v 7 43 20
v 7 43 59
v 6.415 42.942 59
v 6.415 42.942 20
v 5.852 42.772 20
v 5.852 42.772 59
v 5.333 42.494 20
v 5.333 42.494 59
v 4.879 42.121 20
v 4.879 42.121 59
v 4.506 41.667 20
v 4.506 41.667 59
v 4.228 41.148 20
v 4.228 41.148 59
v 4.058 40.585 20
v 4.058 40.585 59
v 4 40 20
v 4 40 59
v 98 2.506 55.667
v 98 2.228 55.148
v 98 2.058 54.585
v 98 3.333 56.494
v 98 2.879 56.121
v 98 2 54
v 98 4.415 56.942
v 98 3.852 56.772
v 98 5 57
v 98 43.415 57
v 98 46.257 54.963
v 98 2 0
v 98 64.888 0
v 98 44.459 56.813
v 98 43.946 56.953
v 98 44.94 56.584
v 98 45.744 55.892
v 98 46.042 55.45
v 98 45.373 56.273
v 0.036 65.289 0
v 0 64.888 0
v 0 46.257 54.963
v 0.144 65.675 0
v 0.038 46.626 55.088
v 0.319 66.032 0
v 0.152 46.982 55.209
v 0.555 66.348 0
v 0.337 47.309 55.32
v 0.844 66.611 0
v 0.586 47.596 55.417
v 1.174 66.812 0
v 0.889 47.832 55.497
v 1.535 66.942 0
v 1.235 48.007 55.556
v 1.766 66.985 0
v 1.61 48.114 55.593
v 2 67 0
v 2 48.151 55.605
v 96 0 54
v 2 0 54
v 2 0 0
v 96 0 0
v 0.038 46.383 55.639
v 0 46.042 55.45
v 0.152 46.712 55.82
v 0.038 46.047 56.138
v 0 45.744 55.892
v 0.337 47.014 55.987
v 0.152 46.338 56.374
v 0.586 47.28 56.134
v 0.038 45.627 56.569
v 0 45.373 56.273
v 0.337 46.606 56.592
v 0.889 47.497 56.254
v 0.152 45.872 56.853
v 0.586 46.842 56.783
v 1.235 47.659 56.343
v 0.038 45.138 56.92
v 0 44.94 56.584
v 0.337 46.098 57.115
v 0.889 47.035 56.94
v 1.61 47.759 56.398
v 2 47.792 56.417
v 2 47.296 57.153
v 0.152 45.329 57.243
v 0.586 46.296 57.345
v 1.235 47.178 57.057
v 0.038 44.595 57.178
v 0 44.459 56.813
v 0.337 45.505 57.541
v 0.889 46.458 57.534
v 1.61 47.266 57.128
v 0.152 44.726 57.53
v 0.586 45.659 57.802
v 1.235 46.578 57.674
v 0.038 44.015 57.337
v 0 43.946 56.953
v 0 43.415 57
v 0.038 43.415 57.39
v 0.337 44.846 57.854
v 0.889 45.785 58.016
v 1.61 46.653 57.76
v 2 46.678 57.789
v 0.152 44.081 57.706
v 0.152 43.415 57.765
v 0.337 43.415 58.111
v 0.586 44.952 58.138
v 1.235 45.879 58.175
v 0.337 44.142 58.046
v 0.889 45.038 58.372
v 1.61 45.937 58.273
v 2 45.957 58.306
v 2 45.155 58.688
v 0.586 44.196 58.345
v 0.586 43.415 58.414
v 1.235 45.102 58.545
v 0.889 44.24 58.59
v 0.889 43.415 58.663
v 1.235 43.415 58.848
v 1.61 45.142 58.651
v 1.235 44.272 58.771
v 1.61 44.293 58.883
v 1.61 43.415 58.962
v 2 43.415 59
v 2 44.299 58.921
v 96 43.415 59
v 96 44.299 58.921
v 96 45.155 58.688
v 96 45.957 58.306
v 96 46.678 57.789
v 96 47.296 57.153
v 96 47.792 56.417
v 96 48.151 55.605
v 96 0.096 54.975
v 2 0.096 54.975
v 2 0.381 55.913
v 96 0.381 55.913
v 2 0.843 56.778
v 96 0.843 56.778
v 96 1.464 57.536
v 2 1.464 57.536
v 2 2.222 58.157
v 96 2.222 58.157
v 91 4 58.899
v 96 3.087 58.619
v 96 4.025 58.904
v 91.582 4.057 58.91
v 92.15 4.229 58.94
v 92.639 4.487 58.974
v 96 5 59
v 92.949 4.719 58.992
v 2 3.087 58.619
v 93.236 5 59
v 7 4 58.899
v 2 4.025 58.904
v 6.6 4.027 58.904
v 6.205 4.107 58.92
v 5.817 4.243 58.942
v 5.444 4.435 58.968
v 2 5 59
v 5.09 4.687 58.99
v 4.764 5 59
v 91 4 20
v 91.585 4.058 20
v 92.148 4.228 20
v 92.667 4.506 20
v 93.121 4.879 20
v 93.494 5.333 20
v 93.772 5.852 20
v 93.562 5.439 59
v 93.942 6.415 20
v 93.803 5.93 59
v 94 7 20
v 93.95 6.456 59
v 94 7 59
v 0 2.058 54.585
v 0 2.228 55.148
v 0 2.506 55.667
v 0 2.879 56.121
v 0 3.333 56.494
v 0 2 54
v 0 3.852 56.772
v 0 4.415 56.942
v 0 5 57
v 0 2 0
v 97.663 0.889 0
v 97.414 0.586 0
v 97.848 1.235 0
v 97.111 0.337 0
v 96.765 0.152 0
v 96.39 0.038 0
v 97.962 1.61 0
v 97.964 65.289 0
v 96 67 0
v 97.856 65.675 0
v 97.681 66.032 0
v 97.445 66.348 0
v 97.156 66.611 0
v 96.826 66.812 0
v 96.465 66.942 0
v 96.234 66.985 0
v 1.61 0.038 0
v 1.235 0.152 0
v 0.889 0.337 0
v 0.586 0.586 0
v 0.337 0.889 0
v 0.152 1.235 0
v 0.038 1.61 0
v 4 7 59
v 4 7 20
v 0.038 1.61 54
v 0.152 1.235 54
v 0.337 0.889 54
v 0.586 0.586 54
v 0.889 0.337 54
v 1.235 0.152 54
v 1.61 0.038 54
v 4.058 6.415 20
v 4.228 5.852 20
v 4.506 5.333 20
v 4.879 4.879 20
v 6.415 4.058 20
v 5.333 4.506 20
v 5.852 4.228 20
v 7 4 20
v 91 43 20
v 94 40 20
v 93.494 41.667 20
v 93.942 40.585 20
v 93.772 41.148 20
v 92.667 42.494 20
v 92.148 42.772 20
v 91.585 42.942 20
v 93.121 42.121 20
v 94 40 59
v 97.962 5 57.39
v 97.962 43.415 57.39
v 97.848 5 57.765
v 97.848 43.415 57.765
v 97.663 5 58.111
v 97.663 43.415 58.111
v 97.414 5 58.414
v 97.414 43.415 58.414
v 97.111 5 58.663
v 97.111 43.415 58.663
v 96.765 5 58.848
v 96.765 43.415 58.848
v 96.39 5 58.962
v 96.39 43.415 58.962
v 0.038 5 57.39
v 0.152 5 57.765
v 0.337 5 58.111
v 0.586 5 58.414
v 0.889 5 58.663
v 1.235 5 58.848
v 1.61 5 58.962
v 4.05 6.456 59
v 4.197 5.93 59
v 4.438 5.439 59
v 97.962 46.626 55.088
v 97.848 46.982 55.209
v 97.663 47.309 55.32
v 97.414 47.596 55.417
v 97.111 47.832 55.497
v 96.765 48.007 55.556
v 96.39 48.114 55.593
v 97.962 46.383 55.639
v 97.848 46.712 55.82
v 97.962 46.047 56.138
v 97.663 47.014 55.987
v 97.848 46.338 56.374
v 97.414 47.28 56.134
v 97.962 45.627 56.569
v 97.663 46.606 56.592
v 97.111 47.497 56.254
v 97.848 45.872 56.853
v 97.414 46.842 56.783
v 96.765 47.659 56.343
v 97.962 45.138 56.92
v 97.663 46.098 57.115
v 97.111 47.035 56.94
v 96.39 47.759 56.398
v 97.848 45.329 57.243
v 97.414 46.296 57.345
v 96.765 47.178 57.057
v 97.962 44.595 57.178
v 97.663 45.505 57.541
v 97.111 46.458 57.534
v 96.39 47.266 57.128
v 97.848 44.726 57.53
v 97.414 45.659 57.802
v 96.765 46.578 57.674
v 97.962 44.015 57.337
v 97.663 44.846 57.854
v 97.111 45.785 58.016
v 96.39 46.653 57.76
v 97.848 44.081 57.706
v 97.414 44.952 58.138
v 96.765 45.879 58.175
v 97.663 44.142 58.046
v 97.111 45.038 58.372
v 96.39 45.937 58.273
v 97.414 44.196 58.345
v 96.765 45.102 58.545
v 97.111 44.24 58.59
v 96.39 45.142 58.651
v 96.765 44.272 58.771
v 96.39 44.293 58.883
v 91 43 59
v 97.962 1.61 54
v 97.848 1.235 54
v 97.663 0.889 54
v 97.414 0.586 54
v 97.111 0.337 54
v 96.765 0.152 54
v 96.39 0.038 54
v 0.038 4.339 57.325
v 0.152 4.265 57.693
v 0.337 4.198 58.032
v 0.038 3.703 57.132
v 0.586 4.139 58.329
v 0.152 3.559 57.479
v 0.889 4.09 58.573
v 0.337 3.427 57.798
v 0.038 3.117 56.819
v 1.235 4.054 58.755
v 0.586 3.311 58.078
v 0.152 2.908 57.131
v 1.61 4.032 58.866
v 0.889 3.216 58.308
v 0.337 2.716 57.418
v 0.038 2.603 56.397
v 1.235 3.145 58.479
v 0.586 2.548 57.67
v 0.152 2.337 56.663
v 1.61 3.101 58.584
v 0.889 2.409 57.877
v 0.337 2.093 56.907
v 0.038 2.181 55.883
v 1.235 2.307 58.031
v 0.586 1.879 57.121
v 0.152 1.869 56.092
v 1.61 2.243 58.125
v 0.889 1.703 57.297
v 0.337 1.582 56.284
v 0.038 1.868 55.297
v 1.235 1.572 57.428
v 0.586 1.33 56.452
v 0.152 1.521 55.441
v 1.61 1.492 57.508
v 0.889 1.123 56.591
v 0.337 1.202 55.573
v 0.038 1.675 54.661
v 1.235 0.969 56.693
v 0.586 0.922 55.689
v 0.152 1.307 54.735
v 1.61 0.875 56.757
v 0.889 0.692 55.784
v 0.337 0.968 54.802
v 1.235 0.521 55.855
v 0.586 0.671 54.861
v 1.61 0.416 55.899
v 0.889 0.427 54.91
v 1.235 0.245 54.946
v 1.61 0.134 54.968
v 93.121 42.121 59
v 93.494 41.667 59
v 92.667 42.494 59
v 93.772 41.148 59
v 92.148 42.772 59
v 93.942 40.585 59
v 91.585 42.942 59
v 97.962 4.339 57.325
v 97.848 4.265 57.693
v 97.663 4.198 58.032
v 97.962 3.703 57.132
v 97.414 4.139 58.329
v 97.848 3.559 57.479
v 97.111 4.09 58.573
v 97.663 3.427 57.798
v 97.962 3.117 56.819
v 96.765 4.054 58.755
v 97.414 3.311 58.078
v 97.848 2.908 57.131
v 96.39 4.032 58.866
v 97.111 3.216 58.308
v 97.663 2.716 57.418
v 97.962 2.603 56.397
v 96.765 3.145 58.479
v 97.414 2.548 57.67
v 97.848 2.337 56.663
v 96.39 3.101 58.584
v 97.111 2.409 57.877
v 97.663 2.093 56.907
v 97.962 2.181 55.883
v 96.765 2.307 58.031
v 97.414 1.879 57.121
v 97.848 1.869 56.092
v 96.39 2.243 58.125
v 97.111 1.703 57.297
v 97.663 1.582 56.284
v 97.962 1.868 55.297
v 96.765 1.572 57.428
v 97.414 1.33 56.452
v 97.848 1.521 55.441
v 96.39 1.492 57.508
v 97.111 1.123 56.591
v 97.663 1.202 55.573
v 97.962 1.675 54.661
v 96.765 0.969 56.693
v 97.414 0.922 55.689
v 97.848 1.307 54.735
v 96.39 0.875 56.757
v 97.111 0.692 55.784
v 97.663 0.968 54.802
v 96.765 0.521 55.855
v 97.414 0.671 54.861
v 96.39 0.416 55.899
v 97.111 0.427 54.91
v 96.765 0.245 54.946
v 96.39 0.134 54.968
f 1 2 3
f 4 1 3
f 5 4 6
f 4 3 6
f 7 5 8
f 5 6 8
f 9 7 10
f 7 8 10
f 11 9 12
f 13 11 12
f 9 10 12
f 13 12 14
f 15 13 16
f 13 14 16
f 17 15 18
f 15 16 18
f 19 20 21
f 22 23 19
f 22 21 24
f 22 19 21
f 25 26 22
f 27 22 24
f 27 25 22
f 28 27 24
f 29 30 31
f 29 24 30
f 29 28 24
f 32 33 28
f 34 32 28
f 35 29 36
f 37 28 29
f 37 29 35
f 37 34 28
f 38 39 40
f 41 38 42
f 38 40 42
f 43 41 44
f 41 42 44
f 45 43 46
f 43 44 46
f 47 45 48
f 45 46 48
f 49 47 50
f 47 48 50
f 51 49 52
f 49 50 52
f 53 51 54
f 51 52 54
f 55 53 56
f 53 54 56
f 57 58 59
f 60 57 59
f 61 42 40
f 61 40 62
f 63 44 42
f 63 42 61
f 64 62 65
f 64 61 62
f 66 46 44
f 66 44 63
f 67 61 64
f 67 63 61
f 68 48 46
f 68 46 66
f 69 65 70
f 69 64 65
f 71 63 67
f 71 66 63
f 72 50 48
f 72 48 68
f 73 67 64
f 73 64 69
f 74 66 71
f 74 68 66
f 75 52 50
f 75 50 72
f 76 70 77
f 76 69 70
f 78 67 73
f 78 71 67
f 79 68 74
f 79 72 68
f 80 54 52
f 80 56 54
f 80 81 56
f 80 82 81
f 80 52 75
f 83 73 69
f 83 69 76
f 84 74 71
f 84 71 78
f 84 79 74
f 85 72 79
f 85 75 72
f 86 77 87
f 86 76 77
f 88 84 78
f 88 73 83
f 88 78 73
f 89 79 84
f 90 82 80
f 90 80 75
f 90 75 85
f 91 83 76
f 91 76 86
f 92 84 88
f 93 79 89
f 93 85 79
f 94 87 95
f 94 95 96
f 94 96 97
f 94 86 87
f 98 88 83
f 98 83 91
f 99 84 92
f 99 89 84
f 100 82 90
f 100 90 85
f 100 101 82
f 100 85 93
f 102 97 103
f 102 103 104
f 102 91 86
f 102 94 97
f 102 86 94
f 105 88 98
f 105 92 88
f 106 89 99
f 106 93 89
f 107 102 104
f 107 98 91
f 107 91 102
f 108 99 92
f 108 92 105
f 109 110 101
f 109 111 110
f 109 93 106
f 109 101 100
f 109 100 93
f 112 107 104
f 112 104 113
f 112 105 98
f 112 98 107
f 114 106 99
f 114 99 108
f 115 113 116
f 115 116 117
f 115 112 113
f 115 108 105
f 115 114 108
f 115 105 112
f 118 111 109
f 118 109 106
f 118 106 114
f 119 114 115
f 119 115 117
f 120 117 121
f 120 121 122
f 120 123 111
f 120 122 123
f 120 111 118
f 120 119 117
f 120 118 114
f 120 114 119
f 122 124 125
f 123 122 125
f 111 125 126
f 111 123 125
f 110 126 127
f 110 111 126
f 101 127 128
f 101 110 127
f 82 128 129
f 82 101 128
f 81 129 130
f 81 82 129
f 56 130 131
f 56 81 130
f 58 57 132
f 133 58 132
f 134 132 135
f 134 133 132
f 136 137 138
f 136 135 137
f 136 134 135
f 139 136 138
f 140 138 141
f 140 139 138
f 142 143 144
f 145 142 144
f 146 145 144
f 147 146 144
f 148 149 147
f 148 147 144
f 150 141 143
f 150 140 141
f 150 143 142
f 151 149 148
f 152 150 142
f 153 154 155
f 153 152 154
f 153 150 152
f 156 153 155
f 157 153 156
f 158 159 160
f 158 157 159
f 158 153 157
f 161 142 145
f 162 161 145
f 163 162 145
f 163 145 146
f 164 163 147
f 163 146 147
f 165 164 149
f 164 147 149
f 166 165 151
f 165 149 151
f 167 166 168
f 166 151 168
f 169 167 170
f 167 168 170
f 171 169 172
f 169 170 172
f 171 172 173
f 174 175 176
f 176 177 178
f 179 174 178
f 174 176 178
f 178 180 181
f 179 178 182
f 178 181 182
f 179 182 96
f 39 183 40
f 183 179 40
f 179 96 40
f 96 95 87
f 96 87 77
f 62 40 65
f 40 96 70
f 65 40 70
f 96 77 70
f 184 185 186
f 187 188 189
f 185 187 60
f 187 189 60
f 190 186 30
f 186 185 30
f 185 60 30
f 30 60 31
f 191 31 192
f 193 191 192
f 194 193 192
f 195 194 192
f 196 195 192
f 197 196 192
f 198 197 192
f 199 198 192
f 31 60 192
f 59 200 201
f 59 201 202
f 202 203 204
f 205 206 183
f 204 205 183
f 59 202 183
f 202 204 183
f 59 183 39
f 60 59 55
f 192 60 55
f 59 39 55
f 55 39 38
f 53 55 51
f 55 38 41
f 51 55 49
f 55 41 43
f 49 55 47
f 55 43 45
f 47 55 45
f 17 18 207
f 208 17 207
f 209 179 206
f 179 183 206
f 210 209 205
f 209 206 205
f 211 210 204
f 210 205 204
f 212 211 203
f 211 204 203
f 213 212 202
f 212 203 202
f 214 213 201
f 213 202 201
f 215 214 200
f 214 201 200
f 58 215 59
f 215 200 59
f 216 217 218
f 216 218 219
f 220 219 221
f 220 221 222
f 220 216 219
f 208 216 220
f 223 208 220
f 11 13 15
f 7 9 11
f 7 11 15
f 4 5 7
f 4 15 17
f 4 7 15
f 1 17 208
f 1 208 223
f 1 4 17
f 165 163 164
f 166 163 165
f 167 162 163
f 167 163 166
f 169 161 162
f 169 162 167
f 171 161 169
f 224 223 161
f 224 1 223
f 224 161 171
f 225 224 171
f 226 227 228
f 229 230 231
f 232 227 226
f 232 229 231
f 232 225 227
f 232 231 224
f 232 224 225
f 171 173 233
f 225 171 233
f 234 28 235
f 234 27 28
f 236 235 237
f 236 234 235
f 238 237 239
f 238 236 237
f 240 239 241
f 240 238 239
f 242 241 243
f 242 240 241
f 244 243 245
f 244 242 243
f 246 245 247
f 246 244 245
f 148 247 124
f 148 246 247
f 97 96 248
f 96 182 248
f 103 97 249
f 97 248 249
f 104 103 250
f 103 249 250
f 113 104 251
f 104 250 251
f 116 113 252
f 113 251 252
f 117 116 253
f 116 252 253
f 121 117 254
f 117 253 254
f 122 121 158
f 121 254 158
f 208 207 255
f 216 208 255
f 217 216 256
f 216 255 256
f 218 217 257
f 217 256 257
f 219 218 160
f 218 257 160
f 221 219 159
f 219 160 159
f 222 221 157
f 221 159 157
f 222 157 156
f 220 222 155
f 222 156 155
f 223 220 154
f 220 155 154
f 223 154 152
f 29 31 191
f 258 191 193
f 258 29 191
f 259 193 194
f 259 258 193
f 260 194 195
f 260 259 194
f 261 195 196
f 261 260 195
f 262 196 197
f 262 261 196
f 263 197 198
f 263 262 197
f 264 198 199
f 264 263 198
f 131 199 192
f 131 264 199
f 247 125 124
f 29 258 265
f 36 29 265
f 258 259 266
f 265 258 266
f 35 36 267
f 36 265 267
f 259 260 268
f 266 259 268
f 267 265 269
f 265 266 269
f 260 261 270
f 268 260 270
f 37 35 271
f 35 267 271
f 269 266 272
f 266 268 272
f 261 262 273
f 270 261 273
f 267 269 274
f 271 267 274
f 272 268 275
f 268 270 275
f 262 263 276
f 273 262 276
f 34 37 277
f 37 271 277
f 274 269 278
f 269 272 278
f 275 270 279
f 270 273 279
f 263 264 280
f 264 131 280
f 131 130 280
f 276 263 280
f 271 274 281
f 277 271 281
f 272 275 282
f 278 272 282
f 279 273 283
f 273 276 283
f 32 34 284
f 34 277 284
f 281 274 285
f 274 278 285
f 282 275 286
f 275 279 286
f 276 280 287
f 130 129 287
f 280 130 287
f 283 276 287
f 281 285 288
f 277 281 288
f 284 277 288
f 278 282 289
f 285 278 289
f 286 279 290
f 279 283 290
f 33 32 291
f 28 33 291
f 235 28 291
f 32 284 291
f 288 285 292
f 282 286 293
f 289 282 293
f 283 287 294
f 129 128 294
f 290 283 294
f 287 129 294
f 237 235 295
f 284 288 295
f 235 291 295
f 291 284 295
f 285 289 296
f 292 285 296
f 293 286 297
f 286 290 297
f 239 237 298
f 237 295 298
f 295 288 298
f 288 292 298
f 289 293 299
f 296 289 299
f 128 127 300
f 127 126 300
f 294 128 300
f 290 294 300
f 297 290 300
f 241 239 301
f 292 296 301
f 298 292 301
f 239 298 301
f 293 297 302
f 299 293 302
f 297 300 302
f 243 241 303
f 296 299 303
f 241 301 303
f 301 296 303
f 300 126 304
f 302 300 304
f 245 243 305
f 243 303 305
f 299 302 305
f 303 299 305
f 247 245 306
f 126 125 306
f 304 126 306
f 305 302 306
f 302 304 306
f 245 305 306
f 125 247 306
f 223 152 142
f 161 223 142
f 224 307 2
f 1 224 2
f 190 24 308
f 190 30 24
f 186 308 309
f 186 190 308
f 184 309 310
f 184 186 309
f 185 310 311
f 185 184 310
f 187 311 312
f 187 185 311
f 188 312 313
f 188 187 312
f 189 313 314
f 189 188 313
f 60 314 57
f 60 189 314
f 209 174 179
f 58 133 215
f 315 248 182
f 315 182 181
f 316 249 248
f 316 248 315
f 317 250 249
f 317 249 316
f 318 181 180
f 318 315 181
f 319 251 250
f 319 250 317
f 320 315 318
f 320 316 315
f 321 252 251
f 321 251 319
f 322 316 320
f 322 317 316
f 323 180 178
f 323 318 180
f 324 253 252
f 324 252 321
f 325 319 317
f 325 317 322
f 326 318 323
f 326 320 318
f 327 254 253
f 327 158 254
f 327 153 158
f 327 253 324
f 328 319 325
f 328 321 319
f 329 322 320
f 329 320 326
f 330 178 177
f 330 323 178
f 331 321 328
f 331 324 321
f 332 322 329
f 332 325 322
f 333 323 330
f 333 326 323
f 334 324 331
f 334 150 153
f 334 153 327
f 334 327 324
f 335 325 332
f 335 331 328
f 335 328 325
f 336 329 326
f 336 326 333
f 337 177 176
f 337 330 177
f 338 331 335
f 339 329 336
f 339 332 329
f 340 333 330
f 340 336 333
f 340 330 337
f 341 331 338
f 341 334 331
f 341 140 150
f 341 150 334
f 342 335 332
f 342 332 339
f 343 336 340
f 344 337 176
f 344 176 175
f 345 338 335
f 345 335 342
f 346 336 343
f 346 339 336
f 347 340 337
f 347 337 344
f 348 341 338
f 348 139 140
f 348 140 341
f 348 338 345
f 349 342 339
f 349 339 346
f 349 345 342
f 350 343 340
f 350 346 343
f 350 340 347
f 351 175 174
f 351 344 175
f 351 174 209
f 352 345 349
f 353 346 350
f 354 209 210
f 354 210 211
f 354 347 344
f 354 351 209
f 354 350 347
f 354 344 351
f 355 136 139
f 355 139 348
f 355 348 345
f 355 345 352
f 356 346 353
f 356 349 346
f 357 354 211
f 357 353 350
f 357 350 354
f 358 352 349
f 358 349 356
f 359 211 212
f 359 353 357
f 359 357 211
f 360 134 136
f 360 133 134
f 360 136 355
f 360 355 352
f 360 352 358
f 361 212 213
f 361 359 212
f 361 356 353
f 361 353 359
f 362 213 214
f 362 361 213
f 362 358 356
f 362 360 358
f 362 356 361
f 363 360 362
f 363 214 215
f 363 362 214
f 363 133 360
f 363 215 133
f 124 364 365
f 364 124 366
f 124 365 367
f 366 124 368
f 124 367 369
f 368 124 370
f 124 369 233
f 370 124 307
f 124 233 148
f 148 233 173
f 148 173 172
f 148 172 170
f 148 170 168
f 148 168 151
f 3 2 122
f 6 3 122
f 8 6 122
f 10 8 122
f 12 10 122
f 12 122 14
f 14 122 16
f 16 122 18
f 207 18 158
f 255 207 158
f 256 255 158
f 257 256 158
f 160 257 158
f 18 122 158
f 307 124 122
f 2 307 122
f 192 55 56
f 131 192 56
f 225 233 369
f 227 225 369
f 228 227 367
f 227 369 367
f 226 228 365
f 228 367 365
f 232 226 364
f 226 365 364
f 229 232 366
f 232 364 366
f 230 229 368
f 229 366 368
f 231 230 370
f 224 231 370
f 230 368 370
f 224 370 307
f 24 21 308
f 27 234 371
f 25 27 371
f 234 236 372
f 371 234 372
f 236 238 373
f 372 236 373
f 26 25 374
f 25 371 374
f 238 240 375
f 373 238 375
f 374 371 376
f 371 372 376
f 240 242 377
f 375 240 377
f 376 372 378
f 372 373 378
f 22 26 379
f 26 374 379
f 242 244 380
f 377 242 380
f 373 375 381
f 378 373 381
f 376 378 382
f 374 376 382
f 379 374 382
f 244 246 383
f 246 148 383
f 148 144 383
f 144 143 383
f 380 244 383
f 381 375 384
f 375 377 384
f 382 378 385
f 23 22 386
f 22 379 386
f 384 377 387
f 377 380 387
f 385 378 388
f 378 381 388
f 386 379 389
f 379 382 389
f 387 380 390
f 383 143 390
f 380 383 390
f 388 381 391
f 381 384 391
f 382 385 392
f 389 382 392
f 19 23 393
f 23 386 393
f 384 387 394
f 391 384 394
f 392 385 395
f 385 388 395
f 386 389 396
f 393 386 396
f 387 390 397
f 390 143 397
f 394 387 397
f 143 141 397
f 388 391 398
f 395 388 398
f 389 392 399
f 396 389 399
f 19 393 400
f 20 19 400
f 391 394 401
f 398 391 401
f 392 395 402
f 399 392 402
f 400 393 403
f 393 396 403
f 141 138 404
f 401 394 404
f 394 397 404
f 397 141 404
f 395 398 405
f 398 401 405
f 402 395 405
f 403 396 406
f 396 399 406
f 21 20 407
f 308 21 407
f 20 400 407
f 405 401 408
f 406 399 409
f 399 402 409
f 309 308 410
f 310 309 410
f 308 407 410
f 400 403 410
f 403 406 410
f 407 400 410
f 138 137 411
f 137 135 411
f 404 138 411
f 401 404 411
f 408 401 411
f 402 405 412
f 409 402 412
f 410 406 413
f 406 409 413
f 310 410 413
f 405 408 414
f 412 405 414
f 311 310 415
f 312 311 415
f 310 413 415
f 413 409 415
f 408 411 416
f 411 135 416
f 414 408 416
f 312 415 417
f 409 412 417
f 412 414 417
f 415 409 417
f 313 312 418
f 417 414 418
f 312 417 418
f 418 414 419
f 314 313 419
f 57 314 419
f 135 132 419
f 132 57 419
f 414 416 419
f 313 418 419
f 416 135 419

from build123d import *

# Parameters (mm, degrees)
F1_DEPTH    = 98
F3_DEPTH    = 39
F4_T1_DEPTH = 123
F4_T3_DEPTH = 115.9227425884
F5_R        = 2


# Not quite as in the source:
# - a fillet or chamfer that OpenCascade refuses, or shapes differently, is made with other operations: its cross-section is extruded or revolved along the edge and cut away or added


with BuildPart() as f1:
    # F0 (on Right) → F1 (new body)
    with BuildSketch(Plane.YZ):
        Polygon((0, 59), (0, 0), (67, 0), (47, 59), align=None)
    extrude(amount=F1_DEPTH)

    # F2 (on face) → F3 (cut)
    with BuildSketch(Plane.XY.offset(59)):
        with BuildLine():
            Line((91, 43), (7, 43))
            ThreePointArc((7, 43), (4.8786796564, 42.1213203436), (4, 40))
            Line((4, 40), (4, 7))
            ThreePointArc((4, 7), (4.8786796564, 4.8786796564), (7, 4))
            Line((7, 4), (91, 4))
            ThreePointArc((91, 4), (93.1213203436, 4.8786796564), (94, 7))
            Line((94, 7), (94, 40))
            ThreePointArc((94, 40), (93.1213203436, 42.1213203436), (91, 43))
        make_face()
    extrude(amount=-F3_DEPTH, mode=Mode.SUBTRACT)

    # F4: fillet of radius 5 on 2 edges, made by hand

    # F4_s2 → F4_t1 (cut)
    with BuildSketch(Plane.YZ.offset(-12.5)):
        with BuildLine():
            ThreePointArc((0, 54), (1.4644660941, 57.5355339059), (5, 59))
            Line((5, 59), (0, 59))
            Line((0, 59), (0, 54))
        make_face()
    extrude(amount=F4_T1_DEPTH, mode=Mode.SUBTRACT)

    # F4_s4 → F4_t3 (cut)
    with BuildSketch(Plane.YZ.offset(-8.9613712942)):
        with BuildLine():
            ThreePointArc((43.4154514823, 59), (46.3286986372, 58.063617971), (48.1507808794, 55.6051964058))
            Line((48.1507808794, 55.6051964058), (47, 59))
            Line((47, 59), (43.4154514823, 59))
        make_face()
    extrude(amount=F4_T3_DEPTH, mode=Mode.SUBTRACT)

    # F5
    f5_edges = [f1.edges().sort_by_distance(p)[0] for p in [
        (0, 24.207726, 59),
        (98, 24.207726, 59),
        (0, 0, 27),
        (98, 0, 27),
        (0, 1.464466, 57.535534),
        (0, 46.328699, 58.063618),
        (0, 57.57539, 27.802598),
        (98, 1.464466, 57.535534),
        (98, 46.328699, 58.063618),
        (98, 57.57539, 27.802598),
    ]]
    fillet(f5_edges, radius=F5_R)


solid = f1.part
